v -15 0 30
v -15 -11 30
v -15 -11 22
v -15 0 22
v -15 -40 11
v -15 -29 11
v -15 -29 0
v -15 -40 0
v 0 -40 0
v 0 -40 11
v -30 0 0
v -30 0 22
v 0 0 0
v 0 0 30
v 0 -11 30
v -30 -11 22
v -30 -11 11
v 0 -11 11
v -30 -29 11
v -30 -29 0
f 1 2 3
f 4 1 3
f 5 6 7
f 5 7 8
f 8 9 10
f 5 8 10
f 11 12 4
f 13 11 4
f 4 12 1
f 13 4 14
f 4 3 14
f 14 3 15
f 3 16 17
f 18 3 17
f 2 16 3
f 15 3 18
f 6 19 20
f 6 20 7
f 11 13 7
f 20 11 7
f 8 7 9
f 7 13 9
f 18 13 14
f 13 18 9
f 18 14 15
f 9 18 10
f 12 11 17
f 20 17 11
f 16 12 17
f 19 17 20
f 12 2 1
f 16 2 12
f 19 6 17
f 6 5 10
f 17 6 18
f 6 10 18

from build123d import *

# Parameters (mm, degrees)
F1_DEPTH  = 30
F2_W      = 11
F2_H      = 15
F3_DEPTH  = 11
F4_W      = 15
F4_H      = 8
F5_DEPTH  = 11
F6_ANGLE  = -90
F8_DEPTH  = 11
F10_DEPTH = 11


with BuildPart() as f1:
    # F0 (on Front) → F1 (new body)
    with BuildSketch(Plane.XZ):
        Polygon((0, 30), (0, 0), (40, 0), (40, 11), (11, 11), (11, 30), align=None)
    extrude(amount=F1_DEPTH)

    # F2 (on face) → F3 (cut, through all)
    with BuildSketch(Plane.XY.offset(11)):
        with Locations((34.5, -22.5)):
            Rectangle(F2_W, F2_H)
    extrude(amount=-F3_DEPTH, mode=Mode.SUBTRACT)

    # F4 (on face) → F5 (cut, through all)
    with BuildSketch(Plane.YZ.offset(11)):
        with Locations((-22.5, 26)):
            Rectangle(F4_W, F4_H)
    extrude(amount=-F5_DEPTH, mode=Mode.SUBTRACT)


with BuildPart() as f1_1:
    # F6: moved
    add(f1.part.rotate(Axis((0, 0, 15), (0, 0, 1)), F6_ANGLE))

    # F7 (on face) → F8 (join, through all)
    with BuildSketch(Plane.XZ.offset(11)):
        Polygon((-15, 22), (-15, 30), (-30, 22), align=None)
    extrude(amount=-F8_DEPTH)

    # F9 (on face) → F10 (cut, through all)
    with BuildSketch(Plane.XZ.offset(11)):
        Polygon((0, 30), (-15, 30), (-15, 22), align=None)
    extrude(amount=-F10_DEPTH, mode=Mode.SUBTRACT)


solid = f1_1.part
